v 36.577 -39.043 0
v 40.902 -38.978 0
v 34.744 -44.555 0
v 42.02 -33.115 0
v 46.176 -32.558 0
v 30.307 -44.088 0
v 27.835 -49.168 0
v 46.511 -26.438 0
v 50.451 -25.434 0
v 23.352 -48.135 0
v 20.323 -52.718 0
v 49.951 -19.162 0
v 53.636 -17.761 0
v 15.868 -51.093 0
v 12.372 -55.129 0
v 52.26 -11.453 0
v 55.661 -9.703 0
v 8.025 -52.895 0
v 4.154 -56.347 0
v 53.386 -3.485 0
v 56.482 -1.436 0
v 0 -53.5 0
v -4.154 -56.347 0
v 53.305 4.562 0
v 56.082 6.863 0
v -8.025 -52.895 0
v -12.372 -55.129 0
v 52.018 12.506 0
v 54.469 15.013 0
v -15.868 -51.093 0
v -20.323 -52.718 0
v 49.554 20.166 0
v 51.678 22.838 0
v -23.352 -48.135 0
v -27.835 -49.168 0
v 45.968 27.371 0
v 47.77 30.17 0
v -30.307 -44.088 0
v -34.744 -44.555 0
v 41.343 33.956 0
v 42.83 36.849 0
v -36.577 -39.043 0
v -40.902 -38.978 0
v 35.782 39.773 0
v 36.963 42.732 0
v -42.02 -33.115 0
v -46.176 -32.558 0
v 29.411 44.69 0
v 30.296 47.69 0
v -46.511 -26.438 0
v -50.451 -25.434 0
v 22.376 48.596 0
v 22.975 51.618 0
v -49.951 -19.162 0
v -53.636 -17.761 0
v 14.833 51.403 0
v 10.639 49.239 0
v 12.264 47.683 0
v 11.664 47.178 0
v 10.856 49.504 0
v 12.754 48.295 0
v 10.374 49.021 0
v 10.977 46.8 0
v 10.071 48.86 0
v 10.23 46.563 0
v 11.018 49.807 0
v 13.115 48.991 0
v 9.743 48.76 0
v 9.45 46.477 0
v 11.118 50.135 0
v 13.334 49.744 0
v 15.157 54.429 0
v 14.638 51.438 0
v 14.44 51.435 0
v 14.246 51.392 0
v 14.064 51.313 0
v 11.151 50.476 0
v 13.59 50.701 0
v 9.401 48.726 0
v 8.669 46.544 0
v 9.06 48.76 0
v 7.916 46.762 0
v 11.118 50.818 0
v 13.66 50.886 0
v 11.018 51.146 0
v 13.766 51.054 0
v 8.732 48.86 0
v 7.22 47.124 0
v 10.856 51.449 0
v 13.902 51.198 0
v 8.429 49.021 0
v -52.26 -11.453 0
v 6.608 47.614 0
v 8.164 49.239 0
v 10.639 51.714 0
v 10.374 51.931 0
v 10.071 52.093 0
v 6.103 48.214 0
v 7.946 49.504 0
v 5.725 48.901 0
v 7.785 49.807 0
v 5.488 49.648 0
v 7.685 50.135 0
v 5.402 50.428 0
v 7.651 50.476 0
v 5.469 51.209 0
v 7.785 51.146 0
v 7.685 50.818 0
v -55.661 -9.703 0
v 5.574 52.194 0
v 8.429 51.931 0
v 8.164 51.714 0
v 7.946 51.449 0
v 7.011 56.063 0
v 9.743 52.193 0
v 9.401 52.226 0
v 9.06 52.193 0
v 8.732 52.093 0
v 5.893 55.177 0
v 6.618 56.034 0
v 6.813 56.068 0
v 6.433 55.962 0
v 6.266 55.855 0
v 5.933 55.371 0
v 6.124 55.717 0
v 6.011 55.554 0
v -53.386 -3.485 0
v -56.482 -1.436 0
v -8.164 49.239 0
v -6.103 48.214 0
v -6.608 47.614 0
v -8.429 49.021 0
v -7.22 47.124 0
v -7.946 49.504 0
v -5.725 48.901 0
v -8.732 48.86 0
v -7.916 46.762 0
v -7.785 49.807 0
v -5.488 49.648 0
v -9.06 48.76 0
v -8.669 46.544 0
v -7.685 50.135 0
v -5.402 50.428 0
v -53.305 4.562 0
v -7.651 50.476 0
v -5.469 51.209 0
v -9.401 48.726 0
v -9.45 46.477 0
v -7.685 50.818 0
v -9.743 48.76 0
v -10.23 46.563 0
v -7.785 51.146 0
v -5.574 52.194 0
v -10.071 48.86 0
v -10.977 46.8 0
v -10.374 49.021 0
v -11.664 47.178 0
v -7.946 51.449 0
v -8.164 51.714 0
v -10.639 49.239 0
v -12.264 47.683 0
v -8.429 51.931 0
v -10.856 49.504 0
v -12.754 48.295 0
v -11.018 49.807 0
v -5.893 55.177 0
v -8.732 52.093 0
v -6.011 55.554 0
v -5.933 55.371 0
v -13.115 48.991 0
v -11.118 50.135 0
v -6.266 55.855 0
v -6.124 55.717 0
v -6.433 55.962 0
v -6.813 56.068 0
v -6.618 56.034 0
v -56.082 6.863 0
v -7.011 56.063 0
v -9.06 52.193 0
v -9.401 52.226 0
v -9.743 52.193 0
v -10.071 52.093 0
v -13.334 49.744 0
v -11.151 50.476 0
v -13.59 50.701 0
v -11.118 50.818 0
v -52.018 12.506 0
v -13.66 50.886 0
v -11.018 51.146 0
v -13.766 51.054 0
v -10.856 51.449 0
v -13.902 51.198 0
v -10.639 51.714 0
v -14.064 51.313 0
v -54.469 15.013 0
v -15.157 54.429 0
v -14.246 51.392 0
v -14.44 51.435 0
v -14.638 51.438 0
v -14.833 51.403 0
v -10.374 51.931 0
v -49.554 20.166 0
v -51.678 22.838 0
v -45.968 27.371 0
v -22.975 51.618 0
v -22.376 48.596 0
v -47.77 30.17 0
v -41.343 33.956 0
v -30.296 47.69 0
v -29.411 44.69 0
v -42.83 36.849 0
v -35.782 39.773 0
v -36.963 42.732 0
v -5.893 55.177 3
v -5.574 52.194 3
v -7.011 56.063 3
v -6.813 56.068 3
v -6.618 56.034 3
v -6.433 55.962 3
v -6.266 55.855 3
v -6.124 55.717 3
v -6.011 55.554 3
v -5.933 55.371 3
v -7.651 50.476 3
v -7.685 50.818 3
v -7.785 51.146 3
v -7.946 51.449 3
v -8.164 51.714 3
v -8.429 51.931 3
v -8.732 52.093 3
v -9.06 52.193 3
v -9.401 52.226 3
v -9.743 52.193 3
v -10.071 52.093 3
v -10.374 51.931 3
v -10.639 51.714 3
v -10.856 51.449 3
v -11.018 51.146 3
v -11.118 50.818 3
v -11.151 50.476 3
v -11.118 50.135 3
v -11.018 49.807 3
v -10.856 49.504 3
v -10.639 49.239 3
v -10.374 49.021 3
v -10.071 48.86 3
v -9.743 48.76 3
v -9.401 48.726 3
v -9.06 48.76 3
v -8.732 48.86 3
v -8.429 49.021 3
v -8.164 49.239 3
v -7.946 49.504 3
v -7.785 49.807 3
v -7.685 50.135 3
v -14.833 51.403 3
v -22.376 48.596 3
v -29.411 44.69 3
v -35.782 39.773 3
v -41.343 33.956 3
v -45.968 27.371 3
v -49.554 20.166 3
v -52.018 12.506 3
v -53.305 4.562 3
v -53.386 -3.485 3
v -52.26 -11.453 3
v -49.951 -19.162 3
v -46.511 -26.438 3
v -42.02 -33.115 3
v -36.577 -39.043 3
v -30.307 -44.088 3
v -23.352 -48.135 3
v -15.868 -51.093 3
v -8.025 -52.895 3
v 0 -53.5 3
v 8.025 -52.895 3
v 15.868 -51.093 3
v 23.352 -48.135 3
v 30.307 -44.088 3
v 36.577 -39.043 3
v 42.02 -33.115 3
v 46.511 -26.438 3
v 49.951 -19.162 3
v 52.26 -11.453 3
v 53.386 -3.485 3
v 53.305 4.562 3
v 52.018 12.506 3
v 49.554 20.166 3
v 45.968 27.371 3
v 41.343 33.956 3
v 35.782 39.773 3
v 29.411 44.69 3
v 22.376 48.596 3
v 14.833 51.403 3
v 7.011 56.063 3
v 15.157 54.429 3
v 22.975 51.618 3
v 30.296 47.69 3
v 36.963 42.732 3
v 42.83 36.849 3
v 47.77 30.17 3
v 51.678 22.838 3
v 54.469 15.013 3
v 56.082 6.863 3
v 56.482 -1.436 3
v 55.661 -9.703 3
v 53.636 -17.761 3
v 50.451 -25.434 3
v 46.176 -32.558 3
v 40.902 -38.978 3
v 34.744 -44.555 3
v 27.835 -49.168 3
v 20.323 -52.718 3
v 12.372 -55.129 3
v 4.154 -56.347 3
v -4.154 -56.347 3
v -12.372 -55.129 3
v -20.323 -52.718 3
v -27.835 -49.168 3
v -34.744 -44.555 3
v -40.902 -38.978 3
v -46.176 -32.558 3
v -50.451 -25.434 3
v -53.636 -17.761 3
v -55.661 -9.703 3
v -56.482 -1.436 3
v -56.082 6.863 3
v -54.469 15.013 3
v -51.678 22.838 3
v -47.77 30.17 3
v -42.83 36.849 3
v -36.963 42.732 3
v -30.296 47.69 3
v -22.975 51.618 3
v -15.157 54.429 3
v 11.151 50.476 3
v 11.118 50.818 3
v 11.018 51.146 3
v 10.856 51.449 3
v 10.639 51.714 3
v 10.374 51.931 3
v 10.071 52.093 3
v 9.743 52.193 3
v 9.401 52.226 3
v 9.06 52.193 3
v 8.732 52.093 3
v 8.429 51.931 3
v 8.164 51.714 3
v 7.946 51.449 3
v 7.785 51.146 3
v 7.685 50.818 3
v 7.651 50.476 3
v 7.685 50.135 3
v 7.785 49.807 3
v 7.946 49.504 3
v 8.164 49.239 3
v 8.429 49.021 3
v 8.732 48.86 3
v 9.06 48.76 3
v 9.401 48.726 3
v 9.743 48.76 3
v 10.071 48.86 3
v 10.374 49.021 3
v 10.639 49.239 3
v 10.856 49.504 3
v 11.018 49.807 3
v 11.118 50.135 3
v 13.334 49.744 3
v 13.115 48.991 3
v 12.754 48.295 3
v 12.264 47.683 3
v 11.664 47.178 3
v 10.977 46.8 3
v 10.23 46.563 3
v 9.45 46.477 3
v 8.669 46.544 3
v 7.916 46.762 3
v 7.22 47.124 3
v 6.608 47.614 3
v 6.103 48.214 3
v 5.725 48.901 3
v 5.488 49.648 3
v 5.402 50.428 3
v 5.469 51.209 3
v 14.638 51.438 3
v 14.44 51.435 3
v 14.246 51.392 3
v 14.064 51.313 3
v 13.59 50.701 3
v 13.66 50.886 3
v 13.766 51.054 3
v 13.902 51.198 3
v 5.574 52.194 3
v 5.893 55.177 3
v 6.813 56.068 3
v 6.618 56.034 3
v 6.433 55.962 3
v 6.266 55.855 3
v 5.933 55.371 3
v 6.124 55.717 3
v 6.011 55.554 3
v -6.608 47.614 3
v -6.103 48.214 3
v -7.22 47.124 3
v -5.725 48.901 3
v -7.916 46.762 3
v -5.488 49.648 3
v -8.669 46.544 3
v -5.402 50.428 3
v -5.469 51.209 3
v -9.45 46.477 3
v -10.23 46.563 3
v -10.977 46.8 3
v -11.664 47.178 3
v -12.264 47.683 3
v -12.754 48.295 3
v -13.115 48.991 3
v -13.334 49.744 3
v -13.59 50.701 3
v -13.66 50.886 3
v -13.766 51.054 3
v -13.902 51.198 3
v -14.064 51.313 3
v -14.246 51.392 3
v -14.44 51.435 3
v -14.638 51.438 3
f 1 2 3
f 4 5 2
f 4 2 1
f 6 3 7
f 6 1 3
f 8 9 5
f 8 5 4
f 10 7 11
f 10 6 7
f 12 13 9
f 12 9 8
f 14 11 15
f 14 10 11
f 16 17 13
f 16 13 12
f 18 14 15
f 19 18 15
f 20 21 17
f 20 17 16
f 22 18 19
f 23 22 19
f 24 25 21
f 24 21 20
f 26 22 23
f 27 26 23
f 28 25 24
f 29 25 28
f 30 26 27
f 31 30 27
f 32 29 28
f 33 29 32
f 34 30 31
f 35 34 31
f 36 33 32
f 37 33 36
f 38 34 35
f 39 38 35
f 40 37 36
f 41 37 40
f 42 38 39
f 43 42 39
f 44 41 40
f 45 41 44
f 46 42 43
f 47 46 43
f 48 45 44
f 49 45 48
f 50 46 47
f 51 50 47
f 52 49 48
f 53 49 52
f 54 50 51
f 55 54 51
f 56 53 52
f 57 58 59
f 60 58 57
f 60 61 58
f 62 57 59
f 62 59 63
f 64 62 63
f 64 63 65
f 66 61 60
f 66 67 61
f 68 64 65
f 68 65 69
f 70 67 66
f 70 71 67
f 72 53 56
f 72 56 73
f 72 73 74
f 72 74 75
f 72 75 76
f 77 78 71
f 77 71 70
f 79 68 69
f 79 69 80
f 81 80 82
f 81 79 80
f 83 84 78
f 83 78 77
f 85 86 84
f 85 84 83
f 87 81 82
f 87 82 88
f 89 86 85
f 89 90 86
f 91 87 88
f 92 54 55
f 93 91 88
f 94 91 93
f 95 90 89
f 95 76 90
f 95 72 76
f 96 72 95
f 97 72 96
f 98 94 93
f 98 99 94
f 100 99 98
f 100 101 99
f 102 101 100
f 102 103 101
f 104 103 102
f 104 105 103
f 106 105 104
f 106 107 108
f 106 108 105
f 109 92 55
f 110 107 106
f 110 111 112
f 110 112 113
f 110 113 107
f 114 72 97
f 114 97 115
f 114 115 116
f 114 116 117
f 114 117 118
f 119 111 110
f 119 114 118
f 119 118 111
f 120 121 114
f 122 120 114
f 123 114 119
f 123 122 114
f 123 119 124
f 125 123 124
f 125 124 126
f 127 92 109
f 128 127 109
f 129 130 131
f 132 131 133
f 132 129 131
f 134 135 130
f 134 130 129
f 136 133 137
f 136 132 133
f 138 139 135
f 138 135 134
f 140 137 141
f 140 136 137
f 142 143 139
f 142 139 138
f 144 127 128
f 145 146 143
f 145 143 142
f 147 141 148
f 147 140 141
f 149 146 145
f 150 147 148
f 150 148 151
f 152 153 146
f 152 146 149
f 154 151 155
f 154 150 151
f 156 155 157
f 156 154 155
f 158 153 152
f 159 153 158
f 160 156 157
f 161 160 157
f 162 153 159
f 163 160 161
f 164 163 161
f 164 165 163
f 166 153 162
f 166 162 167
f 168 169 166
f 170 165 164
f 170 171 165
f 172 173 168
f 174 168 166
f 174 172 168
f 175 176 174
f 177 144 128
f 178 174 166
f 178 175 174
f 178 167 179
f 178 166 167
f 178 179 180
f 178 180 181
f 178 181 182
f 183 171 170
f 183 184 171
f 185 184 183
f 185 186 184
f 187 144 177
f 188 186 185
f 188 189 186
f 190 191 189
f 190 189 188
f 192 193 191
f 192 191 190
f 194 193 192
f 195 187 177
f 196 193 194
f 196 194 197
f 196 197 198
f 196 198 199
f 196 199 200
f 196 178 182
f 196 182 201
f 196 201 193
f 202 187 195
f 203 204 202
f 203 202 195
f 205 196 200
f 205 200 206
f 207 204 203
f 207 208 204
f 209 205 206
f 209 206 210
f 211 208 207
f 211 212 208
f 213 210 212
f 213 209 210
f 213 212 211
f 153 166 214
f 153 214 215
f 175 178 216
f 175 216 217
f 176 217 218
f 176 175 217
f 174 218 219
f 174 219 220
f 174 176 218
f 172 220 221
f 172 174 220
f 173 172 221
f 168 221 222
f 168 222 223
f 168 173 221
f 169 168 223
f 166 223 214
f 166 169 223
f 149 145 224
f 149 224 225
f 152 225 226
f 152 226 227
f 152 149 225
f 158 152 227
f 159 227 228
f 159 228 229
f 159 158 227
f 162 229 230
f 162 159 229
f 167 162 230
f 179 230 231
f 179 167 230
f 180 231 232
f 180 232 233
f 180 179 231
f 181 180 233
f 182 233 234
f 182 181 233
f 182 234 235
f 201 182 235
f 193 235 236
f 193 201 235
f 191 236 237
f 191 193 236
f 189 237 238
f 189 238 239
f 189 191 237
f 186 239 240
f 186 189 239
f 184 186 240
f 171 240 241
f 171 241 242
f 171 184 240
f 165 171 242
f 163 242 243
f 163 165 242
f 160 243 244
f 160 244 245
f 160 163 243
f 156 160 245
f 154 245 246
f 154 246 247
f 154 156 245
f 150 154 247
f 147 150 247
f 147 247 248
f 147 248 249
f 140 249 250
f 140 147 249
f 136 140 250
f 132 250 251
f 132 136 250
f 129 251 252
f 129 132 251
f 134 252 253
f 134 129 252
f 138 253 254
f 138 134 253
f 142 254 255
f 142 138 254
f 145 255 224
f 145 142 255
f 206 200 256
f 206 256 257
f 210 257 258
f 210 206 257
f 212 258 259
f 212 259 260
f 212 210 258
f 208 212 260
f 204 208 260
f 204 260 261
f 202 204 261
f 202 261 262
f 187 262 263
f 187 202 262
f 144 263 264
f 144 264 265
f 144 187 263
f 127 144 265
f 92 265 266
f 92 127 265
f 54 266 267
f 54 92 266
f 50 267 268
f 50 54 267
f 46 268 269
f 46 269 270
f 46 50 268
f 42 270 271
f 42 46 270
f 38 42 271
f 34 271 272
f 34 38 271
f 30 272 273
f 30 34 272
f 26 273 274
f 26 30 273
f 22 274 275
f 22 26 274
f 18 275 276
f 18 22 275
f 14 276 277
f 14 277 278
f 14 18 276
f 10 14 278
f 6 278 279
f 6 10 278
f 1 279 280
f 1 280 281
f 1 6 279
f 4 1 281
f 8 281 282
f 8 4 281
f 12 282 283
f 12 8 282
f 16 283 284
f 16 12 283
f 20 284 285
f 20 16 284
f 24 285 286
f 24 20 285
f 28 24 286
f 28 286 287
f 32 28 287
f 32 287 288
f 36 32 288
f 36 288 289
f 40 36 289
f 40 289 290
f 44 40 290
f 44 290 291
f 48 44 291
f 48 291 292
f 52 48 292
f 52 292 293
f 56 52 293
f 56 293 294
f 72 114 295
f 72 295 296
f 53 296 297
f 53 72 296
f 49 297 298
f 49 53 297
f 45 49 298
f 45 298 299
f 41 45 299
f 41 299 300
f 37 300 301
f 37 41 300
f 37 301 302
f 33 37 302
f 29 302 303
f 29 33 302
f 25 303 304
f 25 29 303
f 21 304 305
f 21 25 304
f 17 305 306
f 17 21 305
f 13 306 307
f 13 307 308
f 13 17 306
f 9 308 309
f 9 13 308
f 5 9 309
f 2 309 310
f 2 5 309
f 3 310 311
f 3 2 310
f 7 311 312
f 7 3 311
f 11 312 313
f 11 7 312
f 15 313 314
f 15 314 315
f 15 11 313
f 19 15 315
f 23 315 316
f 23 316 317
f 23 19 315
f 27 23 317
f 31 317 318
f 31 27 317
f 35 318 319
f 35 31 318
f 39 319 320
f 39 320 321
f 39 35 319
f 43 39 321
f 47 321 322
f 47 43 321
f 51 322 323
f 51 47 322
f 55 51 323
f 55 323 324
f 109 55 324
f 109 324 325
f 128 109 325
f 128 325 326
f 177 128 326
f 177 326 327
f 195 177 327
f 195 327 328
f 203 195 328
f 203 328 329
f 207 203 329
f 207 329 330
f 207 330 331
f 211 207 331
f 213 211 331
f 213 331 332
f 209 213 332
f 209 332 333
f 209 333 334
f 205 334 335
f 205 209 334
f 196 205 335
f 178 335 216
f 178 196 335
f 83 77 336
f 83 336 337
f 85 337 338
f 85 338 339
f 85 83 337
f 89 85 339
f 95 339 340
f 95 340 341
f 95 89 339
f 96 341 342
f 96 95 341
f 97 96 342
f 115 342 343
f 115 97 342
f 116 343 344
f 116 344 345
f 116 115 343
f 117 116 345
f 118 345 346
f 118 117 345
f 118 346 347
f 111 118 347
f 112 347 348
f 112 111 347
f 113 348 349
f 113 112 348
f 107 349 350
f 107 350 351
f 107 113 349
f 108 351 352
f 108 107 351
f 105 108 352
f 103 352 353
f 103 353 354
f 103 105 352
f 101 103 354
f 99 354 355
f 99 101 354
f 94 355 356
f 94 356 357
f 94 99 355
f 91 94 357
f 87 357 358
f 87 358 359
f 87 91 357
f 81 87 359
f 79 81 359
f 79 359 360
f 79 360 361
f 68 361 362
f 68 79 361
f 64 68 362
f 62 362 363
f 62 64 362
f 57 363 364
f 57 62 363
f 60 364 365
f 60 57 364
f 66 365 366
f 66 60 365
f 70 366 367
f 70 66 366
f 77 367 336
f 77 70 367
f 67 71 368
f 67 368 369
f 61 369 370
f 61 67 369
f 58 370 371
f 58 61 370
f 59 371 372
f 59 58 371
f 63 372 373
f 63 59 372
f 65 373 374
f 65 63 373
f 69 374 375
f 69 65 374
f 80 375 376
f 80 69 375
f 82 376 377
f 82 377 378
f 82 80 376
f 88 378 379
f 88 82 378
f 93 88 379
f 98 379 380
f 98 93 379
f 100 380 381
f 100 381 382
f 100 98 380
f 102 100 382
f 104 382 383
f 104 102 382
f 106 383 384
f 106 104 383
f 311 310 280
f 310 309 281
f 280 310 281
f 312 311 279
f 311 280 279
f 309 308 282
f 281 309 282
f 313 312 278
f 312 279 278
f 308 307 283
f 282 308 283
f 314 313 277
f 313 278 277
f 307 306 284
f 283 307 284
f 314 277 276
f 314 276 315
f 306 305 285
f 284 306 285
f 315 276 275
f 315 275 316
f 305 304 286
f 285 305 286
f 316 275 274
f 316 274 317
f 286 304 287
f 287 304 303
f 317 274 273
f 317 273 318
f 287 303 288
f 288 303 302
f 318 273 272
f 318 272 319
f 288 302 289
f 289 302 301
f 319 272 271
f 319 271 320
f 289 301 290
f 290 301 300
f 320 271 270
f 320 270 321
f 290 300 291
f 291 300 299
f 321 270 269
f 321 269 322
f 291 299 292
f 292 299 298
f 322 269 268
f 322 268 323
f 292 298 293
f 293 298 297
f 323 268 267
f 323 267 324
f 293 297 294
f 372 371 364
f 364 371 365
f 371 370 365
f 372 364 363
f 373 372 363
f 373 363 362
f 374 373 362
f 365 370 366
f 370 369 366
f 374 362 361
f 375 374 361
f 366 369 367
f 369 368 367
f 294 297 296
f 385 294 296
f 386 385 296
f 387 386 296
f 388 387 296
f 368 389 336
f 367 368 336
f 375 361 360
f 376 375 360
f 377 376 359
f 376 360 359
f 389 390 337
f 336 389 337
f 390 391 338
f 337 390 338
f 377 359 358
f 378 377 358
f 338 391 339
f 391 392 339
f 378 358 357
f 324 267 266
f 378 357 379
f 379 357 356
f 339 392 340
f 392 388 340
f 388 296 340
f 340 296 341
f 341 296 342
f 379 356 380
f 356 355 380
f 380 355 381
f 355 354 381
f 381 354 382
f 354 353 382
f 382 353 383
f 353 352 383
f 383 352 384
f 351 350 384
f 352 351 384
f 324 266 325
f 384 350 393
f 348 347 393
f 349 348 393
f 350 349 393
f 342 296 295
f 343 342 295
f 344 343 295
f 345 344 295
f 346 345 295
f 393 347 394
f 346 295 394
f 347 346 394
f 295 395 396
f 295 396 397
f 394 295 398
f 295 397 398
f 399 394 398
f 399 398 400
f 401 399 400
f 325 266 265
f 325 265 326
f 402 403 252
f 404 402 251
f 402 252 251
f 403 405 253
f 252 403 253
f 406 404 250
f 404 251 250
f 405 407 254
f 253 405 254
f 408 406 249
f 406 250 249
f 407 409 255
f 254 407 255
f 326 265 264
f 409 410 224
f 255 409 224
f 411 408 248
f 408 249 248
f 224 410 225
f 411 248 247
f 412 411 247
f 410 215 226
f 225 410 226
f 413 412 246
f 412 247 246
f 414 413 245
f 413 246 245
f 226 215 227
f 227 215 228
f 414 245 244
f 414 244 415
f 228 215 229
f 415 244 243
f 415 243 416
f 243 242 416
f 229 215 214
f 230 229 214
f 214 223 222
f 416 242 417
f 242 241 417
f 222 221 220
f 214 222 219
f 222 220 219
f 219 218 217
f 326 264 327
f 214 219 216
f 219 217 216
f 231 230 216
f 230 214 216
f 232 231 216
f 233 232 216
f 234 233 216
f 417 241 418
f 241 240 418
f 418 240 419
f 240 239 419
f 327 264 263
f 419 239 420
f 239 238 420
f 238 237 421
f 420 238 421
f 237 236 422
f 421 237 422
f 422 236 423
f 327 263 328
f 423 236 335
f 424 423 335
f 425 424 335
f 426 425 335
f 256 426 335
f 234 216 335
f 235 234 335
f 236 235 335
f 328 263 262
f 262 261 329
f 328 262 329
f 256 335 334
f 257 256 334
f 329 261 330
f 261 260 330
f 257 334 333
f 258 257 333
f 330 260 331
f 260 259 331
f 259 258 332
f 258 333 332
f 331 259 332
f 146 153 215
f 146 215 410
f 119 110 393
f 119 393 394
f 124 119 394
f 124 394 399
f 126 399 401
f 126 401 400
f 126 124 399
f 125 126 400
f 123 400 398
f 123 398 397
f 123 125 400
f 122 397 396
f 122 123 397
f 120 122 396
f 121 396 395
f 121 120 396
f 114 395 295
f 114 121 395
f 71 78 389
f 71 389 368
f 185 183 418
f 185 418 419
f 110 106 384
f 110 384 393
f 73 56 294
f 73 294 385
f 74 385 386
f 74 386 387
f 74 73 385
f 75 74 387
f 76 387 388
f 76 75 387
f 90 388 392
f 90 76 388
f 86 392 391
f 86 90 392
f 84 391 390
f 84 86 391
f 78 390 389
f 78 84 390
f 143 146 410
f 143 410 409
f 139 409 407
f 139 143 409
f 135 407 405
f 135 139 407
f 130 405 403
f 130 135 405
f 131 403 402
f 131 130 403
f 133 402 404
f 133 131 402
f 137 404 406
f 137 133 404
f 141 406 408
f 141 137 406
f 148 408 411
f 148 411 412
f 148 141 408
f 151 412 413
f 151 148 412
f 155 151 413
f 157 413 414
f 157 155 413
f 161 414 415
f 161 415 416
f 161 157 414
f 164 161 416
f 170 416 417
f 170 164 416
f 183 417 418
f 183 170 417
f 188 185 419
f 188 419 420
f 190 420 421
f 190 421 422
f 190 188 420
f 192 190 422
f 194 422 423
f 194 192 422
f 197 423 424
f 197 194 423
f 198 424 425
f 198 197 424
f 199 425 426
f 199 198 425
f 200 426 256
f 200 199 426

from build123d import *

# Parameters (mm, degrees)
SCHIZZO1_R                   = 1.75
ESTRUSIONE_ESTRUSIONE1_DEPTH = 3


with BuildPart() as part:
    # Schizzo1 → Estrusione-Estrusione1 (new body)
    with BuildSketch(Plane.XY):
        with BuildLine():
            Line((-5.892848523, 55.177208486), (-5.574209769, 52.193660395))
            Line((-5.574209769, 52.193660395), (-5.469026549, 51.208785854))
            ThreePointArc((-5.469026549, 51.208785854), (-8.668981909, 46.543993716), (-13.333774047, 49.743949076))
            Line((-13.333774047, 49.743949076), (-13.590216265, 50.700651099))
            ThreePointArc((-13.590216265, 50.700651099), (-14.064469506, 51.31253651), (-14.833377583, 51.402537967))
            ThreePointArc((-14.833377583, 51.402537967), (0, -53.5), (14.833377583, 51.402537967))
            ThreePointArc((14.833377583, 51.402537967), (14.064469506, 51.31253651), (13.590216265, 50.700651099))
            Line((13.590216265, 50.700651099), (13.333774047, 49.743949076))
            ThreePointArc((13.333774047, 49.743949076), (8.668981909, 46.543993716), (5.469026549, 51.208785854))
            Line((5.469026549, 51.208785854), (5.574209769, 52.193660395))
            Line((5.574209769, 52.193660395), (5.892848523, 55.177208486))
            ThreePointArc((5.892848523, 55.177208486), (6.266213098, 55.854839586), (7.011287463, 56.063284314))
            ThreePointArc((7.011287463, 56.063284314), (0, -56.5), (-7.011287463, 56.063284314))
            ThreePointArc((-7.011287463, 56.063284314), (-6.266213098, 55.854839586), (-5.892848523, 55.177208486))
        make_face()
        with Locations((-9.401400298, 50.476367465)):
            Circle(SCHIZZO1_R, mode=Mode.SUBTRACT)
        with Locations((9.401400298, 50.476367465)):
            Circle(SCHIZZO1_R, mode=Mode.SUBTRACT)
    extrude(amount=ESTRUSIONE_ESTRUSIONE1_DEPTH)


solid = part.part
